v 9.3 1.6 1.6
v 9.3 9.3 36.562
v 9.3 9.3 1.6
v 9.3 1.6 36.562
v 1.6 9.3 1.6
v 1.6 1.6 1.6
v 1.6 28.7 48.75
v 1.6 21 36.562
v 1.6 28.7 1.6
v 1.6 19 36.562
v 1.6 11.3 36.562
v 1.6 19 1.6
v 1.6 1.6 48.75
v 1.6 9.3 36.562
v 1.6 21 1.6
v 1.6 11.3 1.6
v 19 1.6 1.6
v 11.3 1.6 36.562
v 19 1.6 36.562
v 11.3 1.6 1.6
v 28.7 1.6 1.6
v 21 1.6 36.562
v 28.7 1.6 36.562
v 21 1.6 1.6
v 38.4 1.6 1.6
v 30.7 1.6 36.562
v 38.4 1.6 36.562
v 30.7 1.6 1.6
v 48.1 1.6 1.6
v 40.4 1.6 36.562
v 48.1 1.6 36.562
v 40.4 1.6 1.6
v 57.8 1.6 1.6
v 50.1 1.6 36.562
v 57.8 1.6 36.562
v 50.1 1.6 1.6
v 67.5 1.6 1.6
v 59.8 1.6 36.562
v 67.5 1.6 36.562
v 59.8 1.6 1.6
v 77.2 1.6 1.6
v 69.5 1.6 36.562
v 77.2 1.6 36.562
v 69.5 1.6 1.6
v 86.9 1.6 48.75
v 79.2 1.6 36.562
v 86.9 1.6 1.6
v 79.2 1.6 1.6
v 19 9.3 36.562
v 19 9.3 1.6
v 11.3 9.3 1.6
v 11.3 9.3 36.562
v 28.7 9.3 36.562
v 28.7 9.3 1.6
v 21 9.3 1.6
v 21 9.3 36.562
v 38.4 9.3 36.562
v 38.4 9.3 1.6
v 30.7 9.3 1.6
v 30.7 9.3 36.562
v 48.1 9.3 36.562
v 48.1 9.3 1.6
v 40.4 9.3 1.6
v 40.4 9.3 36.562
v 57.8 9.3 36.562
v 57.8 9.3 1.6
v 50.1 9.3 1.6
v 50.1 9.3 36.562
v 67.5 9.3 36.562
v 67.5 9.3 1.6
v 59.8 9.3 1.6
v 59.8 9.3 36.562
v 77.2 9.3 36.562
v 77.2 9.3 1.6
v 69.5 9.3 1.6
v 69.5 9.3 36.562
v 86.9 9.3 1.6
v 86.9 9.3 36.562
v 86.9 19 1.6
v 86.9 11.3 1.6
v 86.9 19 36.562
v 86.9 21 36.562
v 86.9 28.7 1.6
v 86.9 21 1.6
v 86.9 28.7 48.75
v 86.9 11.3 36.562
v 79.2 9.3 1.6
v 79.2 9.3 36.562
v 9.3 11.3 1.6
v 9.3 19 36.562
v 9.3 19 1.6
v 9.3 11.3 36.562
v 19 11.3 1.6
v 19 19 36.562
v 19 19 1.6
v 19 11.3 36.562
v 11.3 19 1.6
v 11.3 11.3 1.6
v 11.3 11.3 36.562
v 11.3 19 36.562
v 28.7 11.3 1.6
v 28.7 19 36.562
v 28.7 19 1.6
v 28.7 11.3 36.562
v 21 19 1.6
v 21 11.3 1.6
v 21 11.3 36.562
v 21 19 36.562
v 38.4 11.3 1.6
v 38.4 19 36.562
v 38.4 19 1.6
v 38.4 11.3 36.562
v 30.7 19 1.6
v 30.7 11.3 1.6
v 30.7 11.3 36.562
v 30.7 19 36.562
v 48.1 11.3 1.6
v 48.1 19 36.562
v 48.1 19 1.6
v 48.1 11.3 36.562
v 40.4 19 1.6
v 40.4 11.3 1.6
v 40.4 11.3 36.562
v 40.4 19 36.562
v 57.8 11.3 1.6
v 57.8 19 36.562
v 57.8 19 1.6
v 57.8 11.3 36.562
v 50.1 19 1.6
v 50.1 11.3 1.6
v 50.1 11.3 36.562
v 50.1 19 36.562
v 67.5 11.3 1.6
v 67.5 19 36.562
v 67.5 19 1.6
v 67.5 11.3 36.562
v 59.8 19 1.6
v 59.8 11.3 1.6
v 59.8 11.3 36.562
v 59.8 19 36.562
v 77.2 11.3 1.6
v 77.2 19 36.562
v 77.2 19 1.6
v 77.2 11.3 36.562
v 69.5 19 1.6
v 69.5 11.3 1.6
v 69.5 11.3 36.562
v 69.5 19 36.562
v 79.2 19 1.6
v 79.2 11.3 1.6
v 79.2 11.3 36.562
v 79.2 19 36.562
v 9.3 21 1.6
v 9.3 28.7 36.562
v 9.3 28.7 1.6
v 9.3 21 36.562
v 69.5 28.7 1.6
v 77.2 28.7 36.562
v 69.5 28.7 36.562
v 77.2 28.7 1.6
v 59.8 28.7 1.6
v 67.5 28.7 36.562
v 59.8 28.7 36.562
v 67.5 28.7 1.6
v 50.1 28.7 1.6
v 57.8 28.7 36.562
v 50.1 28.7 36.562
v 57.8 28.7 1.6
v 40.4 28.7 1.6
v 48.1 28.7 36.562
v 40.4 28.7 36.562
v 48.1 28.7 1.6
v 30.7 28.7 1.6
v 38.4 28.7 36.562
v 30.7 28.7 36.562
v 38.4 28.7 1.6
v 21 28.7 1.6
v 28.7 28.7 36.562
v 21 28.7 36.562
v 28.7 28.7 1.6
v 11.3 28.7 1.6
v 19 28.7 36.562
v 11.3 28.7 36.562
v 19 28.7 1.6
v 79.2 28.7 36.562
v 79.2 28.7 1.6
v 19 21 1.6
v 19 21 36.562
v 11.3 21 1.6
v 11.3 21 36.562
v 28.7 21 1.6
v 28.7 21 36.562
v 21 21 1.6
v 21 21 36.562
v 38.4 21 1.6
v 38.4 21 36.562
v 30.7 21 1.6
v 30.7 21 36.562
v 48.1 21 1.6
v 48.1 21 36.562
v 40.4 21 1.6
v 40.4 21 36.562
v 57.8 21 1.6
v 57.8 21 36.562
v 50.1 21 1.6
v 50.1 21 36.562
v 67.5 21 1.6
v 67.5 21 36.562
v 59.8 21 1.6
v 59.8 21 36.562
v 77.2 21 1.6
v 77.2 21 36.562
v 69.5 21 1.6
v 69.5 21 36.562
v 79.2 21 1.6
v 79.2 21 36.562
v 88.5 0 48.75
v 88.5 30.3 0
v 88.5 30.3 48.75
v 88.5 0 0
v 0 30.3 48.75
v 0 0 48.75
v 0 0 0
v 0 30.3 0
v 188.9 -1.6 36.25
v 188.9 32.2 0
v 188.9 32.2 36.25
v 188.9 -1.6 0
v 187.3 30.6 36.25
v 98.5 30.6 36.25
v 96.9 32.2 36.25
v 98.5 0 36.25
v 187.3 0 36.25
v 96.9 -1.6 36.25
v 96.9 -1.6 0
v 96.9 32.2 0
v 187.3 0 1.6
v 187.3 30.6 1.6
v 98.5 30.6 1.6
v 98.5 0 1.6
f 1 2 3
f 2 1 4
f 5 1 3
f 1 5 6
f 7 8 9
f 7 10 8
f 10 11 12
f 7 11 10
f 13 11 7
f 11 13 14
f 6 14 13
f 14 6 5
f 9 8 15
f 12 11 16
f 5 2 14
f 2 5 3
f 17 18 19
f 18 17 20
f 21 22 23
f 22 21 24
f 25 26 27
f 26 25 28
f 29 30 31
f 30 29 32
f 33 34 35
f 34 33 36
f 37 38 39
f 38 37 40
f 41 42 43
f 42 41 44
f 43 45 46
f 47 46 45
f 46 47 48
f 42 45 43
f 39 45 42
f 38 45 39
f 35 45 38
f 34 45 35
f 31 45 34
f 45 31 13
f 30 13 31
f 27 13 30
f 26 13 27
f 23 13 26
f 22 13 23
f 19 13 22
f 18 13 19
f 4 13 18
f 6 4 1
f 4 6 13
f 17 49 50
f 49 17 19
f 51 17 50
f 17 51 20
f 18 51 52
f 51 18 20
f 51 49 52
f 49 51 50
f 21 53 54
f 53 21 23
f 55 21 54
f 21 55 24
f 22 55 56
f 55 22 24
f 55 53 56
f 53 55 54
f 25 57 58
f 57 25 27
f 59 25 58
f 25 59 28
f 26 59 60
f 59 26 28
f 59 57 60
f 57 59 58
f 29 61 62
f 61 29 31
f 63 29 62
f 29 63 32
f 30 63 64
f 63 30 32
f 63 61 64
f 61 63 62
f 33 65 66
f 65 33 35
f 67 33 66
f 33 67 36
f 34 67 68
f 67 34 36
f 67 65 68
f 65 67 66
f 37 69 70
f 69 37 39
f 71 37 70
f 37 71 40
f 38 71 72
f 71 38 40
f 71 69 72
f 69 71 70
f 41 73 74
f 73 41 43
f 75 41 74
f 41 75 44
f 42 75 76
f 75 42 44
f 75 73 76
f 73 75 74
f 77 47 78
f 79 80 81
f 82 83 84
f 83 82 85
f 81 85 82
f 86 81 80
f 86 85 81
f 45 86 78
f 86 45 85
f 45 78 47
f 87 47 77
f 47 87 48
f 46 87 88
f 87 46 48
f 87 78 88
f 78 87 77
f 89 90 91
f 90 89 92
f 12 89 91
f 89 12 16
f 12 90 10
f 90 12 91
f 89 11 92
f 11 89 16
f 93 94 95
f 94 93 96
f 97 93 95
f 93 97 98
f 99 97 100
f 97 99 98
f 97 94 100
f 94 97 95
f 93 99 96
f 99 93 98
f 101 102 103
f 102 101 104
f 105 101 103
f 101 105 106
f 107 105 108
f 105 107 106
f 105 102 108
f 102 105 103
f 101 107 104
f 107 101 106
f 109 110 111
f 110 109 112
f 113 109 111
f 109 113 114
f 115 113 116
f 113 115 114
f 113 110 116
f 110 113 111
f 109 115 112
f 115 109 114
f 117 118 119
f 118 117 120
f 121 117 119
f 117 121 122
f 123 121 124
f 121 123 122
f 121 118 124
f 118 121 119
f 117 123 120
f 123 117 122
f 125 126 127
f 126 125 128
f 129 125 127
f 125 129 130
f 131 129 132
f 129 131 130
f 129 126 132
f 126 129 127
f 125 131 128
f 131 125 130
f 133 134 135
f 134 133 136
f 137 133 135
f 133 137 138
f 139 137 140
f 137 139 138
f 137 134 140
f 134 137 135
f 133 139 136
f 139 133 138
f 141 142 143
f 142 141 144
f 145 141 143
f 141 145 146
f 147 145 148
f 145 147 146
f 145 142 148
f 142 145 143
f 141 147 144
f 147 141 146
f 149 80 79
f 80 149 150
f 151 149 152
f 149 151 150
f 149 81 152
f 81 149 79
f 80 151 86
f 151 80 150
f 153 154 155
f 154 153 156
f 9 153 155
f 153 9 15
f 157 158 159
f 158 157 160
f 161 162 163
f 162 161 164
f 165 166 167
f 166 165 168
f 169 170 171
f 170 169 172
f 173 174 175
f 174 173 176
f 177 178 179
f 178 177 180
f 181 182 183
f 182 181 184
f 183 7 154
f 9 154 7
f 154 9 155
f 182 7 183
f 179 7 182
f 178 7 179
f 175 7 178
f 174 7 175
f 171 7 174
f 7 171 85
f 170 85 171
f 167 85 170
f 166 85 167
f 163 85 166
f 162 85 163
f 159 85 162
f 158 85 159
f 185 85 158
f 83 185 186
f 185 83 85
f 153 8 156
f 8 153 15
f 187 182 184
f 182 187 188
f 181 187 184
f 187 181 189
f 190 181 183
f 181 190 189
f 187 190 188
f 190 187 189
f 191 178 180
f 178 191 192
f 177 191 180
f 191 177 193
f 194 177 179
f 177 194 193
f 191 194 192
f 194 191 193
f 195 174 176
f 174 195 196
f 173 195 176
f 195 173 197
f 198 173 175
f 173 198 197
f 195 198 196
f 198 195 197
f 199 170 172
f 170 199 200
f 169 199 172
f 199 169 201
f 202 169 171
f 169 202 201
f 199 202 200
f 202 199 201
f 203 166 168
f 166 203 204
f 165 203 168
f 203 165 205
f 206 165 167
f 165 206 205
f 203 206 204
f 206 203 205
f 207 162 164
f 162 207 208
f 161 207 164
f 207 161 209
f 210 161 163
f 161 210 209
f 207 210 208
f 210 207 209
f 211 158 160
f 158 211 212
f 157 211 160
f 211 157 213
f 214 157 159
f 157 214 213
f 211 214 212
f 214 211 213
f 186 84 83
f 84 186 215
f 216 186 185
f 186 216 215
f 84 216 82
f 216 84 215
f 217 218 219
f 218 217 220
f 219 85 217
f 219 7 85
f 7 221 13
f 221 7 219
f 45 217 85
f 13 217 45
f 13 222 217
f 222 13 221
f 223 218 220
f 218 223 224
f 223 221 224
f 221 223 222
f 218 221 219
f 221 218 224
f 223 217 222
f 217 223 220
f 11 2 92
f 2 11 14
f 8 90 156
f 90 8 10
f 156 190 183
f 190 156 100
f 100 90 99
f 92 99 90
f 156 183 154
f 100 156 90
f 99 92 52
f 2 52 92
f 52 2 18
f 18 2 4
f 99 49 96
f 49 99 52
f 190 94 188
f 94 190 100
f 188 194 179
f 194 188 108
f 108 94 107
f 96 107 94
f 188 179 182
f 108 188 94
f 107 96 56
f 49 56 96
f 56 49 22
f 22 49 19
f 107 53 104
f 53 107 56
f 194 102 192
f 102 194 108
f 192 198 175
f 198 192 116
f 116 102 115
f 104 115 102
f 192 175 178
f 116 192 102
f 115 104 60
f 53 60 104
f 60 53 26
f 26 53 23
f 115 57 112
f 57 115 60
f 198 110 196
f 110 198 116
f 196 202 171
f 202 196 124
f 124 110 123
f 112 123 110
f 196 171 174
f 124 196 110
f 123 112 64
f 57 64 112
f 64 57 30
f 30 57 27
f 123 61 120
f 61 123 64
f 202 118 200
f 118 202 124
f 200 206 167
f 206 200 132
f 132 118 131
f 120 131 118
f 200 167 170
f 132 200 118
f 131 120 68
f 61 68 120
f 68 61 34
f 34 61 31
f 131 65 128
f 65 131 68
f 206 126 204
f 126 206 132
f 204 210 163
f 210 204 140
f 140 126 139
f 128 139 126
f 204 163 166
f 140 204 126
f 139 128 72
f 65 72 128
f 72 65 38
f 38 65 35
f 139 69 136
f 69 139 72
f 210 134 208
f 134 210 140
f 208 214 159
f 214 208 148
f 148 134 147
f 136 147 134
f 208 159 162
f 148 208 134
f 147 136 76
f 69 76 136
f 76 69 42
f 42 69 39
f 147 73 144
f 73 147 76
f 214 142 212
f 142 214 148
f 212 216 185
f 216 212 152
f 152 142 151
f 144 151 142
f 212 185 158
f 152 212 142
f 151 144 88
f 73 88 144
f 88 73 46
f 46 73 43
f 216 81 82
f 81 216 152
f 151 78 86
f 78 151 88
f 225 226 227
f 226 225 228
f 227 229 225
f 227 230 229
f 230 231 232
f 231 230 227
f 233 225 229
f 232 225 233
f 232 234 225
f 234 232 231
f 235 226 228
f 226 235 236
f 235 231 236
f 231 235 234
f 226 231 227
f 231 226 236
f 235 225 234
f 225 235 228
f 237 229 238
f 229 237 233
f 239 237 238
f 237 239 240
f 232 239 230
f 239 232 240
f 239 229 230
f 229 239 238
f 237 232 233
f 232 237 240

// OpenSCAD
/*
* Parametric Divider Box
*
*   Author: Bryan Smith - bryan.smith.dev@gmail.com
*   Created Date: 8/24/16
*   Updated Date: 9/10/16
*   Version: 1.3
*
*
*  Creative Commons Attribution-NonCommercial-ShareAlike 3.0 Unported License
*       (https://creativecommons.org/licenses/by-nc-sa/3.0/legalcode)
*/

///////////////////////////////////////////////////////////////////
//Customize the box. Sizes are in millimeters
///////////////////////////////////////////////////////////////////

//Do you want a lid to be generated?
generateLid=1; //[1:true,0:false]

//Do you want the box to be generated?
generateBox=1; //[1:true,0:false]

//What is the height of the item to be placed in the holes in mm?
itemHeight=65;

//What is the size of each hole in mm?
holeSize=7.0;

//Adds to the hole size so you can get items back out of the holes. Don't want it too tight. Can help account for shrinking too. I recomend around 0.7mm)
holeTolerence=0.7;

//Adds spacing to the width fit of the lid to help account for shrinking, printer accuracy, and different materials. (My printer FlashForge Creator Pro can use a tolerence of 0 for flexible material like TPU, but needs to add some space for rigid materials like ABS so that the lid will actually go down on the box.)
lidWidthTolerence=0.3;

//Adds spacing to the length fit of the lid to help account for shrinking, printer accuracy, and different materials. (My printer FlashForge Creator Pro can use a tolerence of 0 for flexible material like TPU, but needs to add some space for rigid materials like ABS so that the lid will actually go down on the box.)
lidLengthTolerence=0.3;

//How many rows of holes?
rows=3;

//How many columns of holes?
columns=9;

//The thickness of the outside lid walls.
lidWallWidth=1.6; 

//The thickness of the outside box walls.
wallWidth=1.6; 

//The thickness of the dividers.
dividerWidth=2;                 

//Box height as compared to item height. Allows the items to stick up higher than the box to help ease getting them out.
boxHeightPercentage=0.75; //[0.05:0.01:1.0]

//Divider height as compared to box height. This allows inset dividers to save material.
dividerHeightPercentage=0.75; //[0:0.01:1.0]

///////////////////////////////////////////////////////////////////
///////////////////////////////////////////////////////////////////

//Calculated Box Sizes. Do not change.
boxWidth=max(((dividerWidth*(columns-1))+(((holeSize+holeTolerence))*columns)+(wallWidth*2)),1);
boxLength=max(((dividerWidth*(rows-1))+(((holeSize+holeTolerence))*rows)+(wallWidth*2)),1);
boxFloorThickness=max(wallWidth,0.1);
boxHeight=max(itemHeight*boxHeightPercentage,1);
dividerHeight=min(boxHeight*dividerHeightPercentage,boxHeight);
lidHeight=(itemHeight-boxHeight)+20;
lidWidth=boxWidth+lidWidthTolerence+(lidWallWidth*2);
lidLength=boxLength+lidLengthTolerence+(lidWallWidth*2);

//Calculate the hole offsets
function holes(x) = ((holeSize+holeTolerence) * x)+(dividerWidth*x);

///////////////////////////////////////////////////////////////////
//Box
///////////////////////////////////////////////////////////////////
if (generateBox)
    difference(){
        difference(){
            cube([boxWidth,boxLength,boxHeight],false);
                for (r = [ 0 : 1 : rows-1 ])
                    for (c = [ 0 : 1 : columns-1 ])
                        translate([holes(c)+wallWidth, holes(r)+wallWidth, boxFloorThickness]) 
                        cube([(holeSize+holeTolerence),(holeSize+holeTolerence),itemHeight], center = false);
        }
        translate([wallWidth,wallWidth,min(dividerHeight,boxHeight+boxFloorThickness)]) 
        cube([boxWidth-(wallWidth*2),boxLength-(wallWidth*2),boxHeight*2],false);
    }

///////////////////////////////////////////////////////////////////
//Lid
///////////////////////////////////////////////////////////////////
if (generateLid)
    difference(){
        translate([-lidWallWidth+(boxWidth)+10,-lidWallWidth,0])
        cube([lidWidth,lidLength,lidHeight],false);

        translate([(boxWidth)+10,0,0])translate([0,0,lidWallWidth]) 
        cube([boxWidth+ lidLengthTolerence,boxLength+lidWidthTolerence,itemHeight*2],false);
    }
